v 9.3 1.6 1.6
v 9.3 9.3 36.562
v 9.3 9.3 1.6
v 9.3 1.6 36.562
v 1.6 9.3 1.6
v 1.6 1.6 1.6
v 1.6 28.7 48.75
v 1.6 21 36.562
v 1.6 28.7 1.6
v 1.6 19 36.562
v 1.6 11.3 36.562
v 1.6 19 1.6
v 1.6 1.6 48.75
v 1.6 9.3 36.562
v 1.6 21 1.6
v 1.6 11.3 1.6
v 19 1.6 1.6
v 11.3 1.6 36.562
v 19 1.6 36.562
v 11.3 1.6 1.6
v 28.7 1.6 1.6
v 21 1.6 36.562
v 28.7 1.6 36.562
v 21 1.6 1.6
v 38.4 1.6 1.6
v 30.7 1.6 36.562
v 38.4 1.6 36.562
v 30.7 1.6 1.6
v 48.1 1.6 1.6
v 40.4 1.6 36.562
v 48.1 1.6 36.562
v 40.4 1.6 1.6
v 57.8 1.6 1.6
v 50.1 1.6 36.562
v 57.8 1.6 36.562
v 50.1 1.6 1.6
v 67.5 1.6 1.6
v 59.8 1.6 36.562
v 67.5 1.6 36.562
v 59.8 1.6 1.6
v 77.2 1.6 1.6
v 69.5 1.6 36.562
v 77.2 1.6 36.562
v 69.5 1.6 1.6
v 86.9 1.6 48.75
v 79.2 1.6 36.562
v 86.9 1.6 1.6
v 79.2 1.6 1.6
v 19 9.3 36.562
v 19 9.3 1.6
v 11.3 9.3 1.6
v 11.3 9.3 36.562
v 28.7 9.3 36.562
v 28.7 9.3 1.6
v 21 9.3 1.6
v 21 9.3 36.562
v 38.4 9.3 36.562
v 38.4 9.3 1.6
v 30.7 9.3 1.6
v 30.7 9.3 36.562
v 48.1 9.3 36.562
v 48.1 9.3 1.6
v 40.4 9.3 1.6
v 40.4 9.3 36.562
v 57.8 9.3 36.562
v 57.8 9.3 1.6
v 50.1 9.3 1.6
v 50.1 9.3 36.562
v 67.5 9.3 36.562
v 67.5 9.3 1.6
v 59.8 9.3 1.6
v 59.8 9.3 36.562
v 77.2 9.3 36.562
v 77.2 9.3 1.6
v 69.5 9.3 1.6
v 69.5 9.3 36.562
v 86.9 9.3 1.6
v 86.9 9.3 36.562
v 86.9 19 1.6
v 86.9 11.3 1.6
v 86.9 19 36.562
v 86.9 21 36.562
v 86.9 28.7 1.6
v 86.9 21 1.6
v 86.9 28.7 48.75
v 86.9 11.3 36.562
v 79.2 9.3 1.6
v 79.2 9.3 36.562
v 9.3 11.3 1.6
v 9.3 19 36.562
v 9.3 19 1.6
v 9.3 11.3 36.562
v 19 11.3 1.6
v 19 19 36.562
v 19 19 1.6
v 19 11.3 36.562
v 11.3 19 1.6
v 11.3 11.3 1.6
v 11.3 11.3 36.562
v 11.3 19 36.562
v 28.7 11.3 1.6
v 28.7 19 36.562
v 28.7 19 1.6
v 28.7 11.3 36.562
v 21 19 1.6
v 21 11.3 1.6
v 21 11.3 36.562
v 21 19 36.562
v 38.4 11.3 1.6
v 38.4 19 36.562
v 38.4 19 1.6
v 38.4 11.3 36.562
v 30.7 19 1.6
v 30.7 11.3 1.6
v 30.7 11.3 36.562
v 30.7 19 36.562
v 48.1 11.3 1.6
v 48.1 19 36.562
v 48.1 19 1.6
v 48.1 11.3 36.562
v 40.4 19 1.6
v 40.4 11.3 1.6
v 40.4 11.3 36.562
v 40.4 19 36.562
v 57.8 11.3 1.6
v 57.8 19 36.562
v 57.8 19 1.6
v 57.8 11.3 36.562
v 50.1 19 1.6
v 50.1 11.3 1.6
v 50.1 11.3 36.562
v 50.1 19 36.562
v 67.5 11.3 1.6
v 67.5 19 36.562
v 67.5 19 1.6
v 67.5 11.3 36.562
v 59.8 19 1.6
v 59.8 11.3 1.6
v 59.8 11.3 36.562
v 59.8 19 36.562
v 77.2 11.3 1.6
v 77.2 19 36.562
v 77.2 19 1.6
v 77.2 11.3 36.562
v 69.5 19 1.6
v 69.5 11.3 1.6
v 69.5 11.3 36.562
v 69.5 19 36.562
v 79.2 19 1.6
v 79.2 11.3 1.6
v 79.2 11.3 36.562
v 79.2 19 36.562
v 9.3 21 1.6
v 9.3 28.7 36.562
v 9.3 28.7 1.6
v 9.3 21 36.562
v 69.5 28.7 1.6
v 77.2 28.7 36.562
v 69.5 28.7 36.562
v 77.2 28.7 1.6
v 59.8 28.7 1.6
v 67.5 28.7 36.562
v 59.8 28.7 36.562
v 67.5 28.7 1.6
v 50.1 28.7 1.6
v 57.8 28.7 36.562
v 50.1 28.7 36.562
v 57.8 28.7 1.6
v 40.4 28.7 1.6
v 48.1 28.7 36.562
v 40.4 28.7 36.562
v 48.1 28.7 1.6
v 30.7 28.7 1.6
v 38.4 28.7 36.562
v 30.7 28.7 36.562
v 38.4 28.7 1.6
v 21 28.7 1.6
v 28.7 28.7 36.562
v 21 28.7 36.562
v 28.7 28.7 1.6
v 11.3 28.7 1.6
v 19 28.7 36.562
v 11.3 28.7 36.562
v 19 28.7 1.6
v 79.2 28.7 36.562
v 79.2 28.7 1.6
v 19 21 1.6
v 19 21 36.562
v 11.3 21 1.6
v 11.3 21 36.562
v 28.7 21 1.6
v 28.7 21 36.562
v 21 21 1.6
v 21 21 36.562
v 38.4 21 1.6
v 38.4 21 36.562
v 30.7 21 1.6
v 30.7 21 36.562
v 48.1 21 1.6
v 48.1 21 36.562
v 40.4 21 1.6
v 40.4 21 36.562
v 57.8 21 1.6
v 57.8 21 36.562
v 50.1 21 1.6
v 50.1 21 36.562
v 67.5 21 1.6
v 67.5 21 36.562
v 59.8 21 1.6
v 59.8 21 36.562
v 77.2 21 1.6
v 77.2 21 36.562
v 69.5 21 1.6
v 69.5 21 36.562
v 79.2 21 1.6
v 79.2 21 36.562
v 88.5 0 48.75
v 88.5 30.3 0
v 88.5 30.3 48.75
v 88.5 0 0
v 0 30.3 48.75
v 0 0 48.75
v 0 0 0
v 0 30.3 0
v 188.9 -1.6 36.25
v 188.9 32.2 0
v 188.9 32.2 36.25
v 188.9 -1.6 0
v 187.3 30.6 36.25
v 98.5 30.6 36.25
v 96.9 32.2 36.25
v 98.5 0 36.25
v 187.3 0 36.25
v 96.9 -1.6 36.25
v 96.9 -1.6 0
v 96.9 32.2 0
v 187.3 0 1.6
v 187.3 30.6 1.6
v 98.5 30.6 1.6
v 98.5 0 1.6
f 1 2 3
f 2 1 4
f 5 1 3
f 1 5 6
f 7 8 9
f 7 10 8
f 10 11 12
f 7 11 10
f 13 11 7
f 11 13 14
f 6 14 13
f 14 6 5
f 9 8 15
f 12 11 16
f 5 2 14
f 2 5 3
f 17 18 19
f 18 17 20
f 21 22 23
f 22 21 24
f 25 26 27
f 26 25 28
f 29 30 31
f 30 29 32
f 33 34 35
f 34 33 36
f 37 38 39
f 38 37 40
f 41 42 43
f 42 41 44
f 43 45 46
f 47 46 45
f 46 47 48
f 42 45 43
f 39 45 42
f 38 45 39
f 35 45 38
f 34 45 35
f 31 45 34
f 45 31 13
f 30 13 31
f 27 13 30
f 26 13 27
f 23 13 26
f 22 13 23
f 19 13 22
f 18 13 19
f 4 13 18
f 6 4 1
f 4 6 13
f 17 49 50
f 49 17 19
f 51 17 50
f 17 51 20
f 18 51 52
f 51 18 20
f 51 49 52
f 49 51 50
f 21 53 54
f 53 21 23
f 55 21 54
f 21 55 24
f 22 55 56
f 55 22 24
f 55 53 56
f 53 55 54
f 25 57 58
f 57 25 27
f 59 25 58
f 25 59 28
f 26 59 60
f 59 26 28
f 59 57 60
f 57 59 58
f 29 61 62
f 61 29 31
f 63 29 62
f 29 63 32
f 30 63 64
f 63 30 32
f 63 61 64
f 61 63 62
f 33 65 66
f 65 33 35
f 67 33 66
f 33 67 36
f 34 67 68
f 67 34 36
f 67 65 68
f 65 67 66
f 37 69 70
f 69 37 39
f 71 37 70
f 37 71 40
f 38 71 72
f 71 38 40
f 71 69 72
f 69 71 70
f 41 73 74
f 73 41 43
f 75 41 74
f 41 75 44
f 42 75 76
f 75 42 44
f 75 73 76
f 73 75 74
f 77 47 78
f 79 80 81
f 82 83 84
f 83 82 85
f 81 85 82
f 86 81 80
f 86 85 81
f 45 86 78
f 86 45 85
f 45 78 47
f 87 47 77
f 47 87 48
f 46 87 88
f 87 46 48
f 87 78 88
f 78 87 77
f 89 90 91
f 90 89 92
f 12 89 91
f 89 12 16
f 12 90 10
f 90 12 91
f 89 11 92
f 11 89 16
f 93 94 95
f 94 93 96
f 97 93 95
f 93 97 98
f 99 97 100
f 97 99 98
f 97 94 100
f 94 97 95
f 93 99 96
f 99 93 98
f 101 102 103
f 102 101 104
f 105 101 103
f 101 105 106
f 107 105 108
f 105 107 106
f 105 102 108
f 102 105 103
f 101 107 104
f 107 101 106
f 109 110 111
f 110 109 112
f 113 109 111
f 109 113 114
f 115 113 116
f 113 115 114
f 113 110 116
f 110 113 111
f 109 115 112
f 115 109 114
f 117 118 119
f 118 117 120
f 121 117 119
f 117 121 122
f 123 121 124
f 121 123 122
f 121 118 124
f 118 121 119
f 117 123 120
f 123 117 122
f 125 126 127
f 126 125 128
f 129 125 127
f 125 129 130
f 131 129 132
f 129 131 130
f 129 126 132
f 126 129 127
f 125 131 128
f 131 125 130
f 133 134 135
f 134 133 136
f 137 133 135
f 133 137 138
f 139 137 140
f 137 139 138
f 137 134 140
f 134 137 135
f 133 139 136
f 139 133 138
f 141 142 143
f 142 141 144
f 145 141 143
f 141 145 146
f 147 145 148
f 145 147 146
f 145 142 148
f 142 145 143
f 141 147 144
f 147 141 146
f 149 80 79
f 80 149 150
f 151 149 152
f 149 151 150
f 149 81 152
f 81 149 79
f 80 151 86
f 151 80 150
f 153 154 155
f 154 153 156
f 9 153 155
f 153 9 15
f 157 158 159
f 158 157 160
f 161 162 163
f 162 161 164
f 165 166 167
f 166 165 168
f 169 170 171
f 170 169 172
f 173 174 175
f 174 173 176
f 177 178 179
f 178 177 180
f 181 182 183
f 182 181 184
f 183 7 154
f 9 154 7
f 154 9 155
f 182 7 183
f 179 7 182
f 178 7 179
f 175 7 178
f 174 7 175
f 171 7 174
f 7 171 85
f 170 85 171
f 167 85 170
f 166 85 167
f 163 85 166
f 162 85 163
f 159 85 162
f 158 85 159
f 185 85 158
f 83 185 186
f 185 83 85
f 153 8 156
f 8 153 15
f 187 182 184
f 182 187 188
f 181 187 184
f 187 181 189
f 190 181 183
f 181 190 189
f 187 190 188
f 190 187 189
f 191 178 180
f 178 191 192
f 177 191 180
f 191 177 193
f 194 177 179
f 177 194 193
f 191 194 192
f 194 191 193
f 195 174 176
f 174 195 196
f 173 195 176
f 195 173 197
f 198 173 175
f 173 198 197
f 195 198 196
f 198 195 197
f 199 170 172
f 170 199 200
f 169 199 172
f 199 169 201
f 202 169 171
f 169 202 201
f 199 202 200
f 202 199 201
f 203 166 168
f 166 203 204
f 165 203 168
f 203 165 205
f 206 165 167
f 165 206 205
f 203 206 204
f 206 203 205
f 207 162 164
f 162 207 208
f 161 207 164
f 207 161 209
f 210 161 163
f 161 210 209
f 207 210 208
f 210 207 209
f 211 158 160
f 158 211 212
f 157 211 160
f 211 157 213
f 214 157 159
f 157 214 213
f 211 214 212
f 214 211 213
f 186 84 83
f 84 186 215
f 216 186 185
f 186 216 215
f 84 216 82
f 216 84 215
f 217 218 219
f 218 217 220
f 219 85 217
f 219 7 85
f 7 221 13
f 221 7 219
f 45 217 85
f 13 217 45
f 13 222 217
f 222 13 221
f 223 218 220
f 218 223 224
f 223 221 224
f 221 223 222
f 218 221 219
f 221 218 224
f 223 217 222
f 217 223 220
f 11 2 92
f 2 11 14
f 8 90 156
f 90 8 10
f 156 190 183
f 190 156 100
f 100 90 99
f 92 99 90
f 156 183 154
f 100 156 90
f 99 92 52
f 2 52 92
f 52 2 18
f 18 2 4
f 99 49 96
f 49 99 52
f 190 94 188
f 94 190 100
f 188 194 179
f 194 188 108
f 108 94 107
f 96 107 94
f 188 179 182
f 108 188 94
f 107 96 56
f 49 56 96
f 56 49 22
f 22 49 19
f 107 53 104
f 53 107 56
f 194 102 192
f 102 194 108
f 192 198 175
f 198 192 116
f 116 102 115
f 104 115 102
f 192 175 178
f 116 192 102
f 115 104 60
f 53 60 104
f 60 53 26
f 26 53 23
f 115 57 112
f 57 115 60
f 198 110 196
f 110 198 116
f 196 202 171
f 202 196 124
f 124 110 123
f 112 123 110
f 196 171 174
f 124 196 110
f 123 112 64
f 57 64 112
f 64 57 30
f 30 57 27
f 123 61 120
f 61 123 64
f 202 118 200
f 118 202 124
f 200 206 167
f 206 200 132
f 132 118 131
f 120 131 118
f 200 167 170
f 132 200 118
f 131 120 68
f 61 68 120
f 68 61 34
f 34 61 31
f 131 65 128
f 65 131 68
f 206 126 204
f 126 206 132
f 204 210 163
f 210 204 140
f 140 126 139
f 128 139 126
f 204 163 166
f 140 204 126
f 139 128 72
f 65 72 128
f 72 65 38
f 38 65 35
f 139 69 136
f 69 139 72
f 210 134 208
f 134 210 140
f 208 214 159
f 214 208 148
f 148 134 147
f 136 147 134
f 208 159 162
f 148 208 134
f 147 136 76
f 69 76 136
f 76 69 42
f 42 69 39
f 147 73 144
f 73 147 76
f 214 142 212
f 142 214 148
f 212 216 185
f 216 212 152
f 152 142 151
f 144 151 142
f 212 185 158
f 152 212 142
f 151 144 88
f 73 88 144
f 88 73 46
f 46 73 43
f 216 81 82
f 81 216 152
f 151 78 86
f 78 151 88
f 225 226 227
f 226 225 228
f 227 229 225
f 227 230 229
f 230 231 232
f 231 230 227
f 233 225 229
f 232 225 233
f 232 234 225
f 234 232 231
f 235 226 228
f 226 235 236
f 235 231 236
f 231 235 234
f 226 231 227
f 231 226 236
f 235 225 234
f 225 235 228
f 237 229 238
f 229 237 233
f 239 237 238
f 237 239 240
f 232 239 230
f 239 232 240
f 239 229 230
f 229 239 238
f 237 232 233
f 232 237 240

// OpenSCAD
/*
* Parametric Divider Box
*
*   Author: Bryan Smith - bryan.smith.dev@gmail.com
*   Created Date: 8/24/16
*   Updated Date: 9/10/16
*   Version: 1.3
*
*
*  Creative Commons Attribution-NonCommercial-ShareAlike 3.0 Unported License
*       (https://creativecommons.org/licenses/by-nc-sa/3.0/legalcode)
*/

///////////////////////////////////////////////////////////////////
//Customize the box. Sizes are in millimeters
///////////////////////////////////////////////////////////////////

//Do you want a lid to be generated?
generateLid=1; //[1:true,0:false]

//Do you want the box to be generated?
generateBox=1; //[1:true,0:false]

//What is the height of the item to be placed in the holes in mm?
itemHeight=65;

//What is the size of each hole in mm?
holeSize=7.0;

//Adds to the hole size so you can get items back out of the holes. Don't want it too tight. Can help account for shrinking too. I recomend around 0.7mm)
holeTolerence=0.7;

//Adds spacing to the width fit of the lid to help account for shrinking, printer accuracy, and different materials. (My printer FlashForge Creator Pro can use a tolerence of 0 for flexible material like TPU, but needs to add some space for rigid materials like ABS so that the lid will actually go down on the box.)
lidWidthTolerence=0.3;

//Adds spacing to the length fit of the lid to help account for shrinking, printer accuracy, and different materials. (My printer FlashForge Creator Pro can use a tolerence of 0 for flexible material like TPU, but needs to add some space for rigid materials like ABS so that the lid will actually go down on the box.)
lidLengthTolerence=0.3;

//How many rows of holes?
rows=3;

//How many columns of holes?
columns=9;

//The thickness of the outside lid walls.
lidWallWidth=1.6; 

//The thickness of the outside box walls.
wallWidth=1.6; 

//The thickness of the dividers.
dividerWidth=2;                 

//Box height as compared to item height. Allows the items to stick up higher than the box to help ease getting them out.
boxHeightPercentage=0.75; //[0.05:0.01:1.0]

//Divider height as compared to box height. This allows inset dividers to save material.
dividerHeightPercentage=0.75; //[0:0.01:1.0]

///////////////////////////////////////////////////////////////////
///////////////////////////////////////////////////////////////////

//Calculated Box Sizes. Do not change.
boxWidth=max(((dividerWidth*(columns-1))+(((holeSize+holeTolerence))*columns)+(wallWidth*2)),1);
boxLength=max(((dividerWidth*(rows-1))+(((holeSize+holeTolerence))*rows)+(wallWidth*2)),1);
boxFloorThickness=max(wallWidth,0.1);
boxHeight=max(itemHeight*boxHeightPercentage,1);
dividerHeight=min(boxHeight*dividerHeightPercentage,boxHeight);
lidHeight=(itemHeight-boxHeight)+20;
lidWidth=boxWidth+lidWidthTolerence+(lidWallWidth*2);
lidLength=boxLength+lidLengthTolerence+(lidWallWidth*2);

//Calculate the hole offsets
function holes(x) = ((holeSize+holeTolerence) * x)+(dividerWidth*x);

///////////////////////////////////////////////////////////////////
//Box
///////////////////////////////////////////////////////////////////
if (generateBox)
    difference(){
        difference(){
            cube([boxWidth,boxLength,boxHeight],false);
                for (r = [ 0 : 1 : rows-1 ])
                    for (c = [ 0 : 1 : columns-1 ])
                        translate([holes(c)+wallWidth, holes(r)+wallWidth, boxFloorThickness]) 
                        cube([(holeSize+holeTolerence),(holeSize+holeTolerence),itemHeight], center = false);
        }
        translate([wallWidth,wallWidth,min(dividerHeight,boxHeight+boxFloorThickness)]) 
        cube([boxWidth-(wallWidth*2),boxLength-(wallWidth*2),boxHeight*2],false);
    }

///////////////////////////////////////////////////////////////////
//Lid
///////////////////////////////////////////////////////////////////
if (generateLid)
    difference(){
        translate([-lidWallWidth+(boxWidth)+10,-lidWallWidth,0])
        cube([lidWidth,lidLength,lidHeight],false);

        translate([(boxWidth)+10,0,0])translate([0,0,lidWallWidth]) 
        cube([boxWidth+ lidLengthTolerence,boxLength+lidWidthTolerence,itemHeight*2],false);
    }
